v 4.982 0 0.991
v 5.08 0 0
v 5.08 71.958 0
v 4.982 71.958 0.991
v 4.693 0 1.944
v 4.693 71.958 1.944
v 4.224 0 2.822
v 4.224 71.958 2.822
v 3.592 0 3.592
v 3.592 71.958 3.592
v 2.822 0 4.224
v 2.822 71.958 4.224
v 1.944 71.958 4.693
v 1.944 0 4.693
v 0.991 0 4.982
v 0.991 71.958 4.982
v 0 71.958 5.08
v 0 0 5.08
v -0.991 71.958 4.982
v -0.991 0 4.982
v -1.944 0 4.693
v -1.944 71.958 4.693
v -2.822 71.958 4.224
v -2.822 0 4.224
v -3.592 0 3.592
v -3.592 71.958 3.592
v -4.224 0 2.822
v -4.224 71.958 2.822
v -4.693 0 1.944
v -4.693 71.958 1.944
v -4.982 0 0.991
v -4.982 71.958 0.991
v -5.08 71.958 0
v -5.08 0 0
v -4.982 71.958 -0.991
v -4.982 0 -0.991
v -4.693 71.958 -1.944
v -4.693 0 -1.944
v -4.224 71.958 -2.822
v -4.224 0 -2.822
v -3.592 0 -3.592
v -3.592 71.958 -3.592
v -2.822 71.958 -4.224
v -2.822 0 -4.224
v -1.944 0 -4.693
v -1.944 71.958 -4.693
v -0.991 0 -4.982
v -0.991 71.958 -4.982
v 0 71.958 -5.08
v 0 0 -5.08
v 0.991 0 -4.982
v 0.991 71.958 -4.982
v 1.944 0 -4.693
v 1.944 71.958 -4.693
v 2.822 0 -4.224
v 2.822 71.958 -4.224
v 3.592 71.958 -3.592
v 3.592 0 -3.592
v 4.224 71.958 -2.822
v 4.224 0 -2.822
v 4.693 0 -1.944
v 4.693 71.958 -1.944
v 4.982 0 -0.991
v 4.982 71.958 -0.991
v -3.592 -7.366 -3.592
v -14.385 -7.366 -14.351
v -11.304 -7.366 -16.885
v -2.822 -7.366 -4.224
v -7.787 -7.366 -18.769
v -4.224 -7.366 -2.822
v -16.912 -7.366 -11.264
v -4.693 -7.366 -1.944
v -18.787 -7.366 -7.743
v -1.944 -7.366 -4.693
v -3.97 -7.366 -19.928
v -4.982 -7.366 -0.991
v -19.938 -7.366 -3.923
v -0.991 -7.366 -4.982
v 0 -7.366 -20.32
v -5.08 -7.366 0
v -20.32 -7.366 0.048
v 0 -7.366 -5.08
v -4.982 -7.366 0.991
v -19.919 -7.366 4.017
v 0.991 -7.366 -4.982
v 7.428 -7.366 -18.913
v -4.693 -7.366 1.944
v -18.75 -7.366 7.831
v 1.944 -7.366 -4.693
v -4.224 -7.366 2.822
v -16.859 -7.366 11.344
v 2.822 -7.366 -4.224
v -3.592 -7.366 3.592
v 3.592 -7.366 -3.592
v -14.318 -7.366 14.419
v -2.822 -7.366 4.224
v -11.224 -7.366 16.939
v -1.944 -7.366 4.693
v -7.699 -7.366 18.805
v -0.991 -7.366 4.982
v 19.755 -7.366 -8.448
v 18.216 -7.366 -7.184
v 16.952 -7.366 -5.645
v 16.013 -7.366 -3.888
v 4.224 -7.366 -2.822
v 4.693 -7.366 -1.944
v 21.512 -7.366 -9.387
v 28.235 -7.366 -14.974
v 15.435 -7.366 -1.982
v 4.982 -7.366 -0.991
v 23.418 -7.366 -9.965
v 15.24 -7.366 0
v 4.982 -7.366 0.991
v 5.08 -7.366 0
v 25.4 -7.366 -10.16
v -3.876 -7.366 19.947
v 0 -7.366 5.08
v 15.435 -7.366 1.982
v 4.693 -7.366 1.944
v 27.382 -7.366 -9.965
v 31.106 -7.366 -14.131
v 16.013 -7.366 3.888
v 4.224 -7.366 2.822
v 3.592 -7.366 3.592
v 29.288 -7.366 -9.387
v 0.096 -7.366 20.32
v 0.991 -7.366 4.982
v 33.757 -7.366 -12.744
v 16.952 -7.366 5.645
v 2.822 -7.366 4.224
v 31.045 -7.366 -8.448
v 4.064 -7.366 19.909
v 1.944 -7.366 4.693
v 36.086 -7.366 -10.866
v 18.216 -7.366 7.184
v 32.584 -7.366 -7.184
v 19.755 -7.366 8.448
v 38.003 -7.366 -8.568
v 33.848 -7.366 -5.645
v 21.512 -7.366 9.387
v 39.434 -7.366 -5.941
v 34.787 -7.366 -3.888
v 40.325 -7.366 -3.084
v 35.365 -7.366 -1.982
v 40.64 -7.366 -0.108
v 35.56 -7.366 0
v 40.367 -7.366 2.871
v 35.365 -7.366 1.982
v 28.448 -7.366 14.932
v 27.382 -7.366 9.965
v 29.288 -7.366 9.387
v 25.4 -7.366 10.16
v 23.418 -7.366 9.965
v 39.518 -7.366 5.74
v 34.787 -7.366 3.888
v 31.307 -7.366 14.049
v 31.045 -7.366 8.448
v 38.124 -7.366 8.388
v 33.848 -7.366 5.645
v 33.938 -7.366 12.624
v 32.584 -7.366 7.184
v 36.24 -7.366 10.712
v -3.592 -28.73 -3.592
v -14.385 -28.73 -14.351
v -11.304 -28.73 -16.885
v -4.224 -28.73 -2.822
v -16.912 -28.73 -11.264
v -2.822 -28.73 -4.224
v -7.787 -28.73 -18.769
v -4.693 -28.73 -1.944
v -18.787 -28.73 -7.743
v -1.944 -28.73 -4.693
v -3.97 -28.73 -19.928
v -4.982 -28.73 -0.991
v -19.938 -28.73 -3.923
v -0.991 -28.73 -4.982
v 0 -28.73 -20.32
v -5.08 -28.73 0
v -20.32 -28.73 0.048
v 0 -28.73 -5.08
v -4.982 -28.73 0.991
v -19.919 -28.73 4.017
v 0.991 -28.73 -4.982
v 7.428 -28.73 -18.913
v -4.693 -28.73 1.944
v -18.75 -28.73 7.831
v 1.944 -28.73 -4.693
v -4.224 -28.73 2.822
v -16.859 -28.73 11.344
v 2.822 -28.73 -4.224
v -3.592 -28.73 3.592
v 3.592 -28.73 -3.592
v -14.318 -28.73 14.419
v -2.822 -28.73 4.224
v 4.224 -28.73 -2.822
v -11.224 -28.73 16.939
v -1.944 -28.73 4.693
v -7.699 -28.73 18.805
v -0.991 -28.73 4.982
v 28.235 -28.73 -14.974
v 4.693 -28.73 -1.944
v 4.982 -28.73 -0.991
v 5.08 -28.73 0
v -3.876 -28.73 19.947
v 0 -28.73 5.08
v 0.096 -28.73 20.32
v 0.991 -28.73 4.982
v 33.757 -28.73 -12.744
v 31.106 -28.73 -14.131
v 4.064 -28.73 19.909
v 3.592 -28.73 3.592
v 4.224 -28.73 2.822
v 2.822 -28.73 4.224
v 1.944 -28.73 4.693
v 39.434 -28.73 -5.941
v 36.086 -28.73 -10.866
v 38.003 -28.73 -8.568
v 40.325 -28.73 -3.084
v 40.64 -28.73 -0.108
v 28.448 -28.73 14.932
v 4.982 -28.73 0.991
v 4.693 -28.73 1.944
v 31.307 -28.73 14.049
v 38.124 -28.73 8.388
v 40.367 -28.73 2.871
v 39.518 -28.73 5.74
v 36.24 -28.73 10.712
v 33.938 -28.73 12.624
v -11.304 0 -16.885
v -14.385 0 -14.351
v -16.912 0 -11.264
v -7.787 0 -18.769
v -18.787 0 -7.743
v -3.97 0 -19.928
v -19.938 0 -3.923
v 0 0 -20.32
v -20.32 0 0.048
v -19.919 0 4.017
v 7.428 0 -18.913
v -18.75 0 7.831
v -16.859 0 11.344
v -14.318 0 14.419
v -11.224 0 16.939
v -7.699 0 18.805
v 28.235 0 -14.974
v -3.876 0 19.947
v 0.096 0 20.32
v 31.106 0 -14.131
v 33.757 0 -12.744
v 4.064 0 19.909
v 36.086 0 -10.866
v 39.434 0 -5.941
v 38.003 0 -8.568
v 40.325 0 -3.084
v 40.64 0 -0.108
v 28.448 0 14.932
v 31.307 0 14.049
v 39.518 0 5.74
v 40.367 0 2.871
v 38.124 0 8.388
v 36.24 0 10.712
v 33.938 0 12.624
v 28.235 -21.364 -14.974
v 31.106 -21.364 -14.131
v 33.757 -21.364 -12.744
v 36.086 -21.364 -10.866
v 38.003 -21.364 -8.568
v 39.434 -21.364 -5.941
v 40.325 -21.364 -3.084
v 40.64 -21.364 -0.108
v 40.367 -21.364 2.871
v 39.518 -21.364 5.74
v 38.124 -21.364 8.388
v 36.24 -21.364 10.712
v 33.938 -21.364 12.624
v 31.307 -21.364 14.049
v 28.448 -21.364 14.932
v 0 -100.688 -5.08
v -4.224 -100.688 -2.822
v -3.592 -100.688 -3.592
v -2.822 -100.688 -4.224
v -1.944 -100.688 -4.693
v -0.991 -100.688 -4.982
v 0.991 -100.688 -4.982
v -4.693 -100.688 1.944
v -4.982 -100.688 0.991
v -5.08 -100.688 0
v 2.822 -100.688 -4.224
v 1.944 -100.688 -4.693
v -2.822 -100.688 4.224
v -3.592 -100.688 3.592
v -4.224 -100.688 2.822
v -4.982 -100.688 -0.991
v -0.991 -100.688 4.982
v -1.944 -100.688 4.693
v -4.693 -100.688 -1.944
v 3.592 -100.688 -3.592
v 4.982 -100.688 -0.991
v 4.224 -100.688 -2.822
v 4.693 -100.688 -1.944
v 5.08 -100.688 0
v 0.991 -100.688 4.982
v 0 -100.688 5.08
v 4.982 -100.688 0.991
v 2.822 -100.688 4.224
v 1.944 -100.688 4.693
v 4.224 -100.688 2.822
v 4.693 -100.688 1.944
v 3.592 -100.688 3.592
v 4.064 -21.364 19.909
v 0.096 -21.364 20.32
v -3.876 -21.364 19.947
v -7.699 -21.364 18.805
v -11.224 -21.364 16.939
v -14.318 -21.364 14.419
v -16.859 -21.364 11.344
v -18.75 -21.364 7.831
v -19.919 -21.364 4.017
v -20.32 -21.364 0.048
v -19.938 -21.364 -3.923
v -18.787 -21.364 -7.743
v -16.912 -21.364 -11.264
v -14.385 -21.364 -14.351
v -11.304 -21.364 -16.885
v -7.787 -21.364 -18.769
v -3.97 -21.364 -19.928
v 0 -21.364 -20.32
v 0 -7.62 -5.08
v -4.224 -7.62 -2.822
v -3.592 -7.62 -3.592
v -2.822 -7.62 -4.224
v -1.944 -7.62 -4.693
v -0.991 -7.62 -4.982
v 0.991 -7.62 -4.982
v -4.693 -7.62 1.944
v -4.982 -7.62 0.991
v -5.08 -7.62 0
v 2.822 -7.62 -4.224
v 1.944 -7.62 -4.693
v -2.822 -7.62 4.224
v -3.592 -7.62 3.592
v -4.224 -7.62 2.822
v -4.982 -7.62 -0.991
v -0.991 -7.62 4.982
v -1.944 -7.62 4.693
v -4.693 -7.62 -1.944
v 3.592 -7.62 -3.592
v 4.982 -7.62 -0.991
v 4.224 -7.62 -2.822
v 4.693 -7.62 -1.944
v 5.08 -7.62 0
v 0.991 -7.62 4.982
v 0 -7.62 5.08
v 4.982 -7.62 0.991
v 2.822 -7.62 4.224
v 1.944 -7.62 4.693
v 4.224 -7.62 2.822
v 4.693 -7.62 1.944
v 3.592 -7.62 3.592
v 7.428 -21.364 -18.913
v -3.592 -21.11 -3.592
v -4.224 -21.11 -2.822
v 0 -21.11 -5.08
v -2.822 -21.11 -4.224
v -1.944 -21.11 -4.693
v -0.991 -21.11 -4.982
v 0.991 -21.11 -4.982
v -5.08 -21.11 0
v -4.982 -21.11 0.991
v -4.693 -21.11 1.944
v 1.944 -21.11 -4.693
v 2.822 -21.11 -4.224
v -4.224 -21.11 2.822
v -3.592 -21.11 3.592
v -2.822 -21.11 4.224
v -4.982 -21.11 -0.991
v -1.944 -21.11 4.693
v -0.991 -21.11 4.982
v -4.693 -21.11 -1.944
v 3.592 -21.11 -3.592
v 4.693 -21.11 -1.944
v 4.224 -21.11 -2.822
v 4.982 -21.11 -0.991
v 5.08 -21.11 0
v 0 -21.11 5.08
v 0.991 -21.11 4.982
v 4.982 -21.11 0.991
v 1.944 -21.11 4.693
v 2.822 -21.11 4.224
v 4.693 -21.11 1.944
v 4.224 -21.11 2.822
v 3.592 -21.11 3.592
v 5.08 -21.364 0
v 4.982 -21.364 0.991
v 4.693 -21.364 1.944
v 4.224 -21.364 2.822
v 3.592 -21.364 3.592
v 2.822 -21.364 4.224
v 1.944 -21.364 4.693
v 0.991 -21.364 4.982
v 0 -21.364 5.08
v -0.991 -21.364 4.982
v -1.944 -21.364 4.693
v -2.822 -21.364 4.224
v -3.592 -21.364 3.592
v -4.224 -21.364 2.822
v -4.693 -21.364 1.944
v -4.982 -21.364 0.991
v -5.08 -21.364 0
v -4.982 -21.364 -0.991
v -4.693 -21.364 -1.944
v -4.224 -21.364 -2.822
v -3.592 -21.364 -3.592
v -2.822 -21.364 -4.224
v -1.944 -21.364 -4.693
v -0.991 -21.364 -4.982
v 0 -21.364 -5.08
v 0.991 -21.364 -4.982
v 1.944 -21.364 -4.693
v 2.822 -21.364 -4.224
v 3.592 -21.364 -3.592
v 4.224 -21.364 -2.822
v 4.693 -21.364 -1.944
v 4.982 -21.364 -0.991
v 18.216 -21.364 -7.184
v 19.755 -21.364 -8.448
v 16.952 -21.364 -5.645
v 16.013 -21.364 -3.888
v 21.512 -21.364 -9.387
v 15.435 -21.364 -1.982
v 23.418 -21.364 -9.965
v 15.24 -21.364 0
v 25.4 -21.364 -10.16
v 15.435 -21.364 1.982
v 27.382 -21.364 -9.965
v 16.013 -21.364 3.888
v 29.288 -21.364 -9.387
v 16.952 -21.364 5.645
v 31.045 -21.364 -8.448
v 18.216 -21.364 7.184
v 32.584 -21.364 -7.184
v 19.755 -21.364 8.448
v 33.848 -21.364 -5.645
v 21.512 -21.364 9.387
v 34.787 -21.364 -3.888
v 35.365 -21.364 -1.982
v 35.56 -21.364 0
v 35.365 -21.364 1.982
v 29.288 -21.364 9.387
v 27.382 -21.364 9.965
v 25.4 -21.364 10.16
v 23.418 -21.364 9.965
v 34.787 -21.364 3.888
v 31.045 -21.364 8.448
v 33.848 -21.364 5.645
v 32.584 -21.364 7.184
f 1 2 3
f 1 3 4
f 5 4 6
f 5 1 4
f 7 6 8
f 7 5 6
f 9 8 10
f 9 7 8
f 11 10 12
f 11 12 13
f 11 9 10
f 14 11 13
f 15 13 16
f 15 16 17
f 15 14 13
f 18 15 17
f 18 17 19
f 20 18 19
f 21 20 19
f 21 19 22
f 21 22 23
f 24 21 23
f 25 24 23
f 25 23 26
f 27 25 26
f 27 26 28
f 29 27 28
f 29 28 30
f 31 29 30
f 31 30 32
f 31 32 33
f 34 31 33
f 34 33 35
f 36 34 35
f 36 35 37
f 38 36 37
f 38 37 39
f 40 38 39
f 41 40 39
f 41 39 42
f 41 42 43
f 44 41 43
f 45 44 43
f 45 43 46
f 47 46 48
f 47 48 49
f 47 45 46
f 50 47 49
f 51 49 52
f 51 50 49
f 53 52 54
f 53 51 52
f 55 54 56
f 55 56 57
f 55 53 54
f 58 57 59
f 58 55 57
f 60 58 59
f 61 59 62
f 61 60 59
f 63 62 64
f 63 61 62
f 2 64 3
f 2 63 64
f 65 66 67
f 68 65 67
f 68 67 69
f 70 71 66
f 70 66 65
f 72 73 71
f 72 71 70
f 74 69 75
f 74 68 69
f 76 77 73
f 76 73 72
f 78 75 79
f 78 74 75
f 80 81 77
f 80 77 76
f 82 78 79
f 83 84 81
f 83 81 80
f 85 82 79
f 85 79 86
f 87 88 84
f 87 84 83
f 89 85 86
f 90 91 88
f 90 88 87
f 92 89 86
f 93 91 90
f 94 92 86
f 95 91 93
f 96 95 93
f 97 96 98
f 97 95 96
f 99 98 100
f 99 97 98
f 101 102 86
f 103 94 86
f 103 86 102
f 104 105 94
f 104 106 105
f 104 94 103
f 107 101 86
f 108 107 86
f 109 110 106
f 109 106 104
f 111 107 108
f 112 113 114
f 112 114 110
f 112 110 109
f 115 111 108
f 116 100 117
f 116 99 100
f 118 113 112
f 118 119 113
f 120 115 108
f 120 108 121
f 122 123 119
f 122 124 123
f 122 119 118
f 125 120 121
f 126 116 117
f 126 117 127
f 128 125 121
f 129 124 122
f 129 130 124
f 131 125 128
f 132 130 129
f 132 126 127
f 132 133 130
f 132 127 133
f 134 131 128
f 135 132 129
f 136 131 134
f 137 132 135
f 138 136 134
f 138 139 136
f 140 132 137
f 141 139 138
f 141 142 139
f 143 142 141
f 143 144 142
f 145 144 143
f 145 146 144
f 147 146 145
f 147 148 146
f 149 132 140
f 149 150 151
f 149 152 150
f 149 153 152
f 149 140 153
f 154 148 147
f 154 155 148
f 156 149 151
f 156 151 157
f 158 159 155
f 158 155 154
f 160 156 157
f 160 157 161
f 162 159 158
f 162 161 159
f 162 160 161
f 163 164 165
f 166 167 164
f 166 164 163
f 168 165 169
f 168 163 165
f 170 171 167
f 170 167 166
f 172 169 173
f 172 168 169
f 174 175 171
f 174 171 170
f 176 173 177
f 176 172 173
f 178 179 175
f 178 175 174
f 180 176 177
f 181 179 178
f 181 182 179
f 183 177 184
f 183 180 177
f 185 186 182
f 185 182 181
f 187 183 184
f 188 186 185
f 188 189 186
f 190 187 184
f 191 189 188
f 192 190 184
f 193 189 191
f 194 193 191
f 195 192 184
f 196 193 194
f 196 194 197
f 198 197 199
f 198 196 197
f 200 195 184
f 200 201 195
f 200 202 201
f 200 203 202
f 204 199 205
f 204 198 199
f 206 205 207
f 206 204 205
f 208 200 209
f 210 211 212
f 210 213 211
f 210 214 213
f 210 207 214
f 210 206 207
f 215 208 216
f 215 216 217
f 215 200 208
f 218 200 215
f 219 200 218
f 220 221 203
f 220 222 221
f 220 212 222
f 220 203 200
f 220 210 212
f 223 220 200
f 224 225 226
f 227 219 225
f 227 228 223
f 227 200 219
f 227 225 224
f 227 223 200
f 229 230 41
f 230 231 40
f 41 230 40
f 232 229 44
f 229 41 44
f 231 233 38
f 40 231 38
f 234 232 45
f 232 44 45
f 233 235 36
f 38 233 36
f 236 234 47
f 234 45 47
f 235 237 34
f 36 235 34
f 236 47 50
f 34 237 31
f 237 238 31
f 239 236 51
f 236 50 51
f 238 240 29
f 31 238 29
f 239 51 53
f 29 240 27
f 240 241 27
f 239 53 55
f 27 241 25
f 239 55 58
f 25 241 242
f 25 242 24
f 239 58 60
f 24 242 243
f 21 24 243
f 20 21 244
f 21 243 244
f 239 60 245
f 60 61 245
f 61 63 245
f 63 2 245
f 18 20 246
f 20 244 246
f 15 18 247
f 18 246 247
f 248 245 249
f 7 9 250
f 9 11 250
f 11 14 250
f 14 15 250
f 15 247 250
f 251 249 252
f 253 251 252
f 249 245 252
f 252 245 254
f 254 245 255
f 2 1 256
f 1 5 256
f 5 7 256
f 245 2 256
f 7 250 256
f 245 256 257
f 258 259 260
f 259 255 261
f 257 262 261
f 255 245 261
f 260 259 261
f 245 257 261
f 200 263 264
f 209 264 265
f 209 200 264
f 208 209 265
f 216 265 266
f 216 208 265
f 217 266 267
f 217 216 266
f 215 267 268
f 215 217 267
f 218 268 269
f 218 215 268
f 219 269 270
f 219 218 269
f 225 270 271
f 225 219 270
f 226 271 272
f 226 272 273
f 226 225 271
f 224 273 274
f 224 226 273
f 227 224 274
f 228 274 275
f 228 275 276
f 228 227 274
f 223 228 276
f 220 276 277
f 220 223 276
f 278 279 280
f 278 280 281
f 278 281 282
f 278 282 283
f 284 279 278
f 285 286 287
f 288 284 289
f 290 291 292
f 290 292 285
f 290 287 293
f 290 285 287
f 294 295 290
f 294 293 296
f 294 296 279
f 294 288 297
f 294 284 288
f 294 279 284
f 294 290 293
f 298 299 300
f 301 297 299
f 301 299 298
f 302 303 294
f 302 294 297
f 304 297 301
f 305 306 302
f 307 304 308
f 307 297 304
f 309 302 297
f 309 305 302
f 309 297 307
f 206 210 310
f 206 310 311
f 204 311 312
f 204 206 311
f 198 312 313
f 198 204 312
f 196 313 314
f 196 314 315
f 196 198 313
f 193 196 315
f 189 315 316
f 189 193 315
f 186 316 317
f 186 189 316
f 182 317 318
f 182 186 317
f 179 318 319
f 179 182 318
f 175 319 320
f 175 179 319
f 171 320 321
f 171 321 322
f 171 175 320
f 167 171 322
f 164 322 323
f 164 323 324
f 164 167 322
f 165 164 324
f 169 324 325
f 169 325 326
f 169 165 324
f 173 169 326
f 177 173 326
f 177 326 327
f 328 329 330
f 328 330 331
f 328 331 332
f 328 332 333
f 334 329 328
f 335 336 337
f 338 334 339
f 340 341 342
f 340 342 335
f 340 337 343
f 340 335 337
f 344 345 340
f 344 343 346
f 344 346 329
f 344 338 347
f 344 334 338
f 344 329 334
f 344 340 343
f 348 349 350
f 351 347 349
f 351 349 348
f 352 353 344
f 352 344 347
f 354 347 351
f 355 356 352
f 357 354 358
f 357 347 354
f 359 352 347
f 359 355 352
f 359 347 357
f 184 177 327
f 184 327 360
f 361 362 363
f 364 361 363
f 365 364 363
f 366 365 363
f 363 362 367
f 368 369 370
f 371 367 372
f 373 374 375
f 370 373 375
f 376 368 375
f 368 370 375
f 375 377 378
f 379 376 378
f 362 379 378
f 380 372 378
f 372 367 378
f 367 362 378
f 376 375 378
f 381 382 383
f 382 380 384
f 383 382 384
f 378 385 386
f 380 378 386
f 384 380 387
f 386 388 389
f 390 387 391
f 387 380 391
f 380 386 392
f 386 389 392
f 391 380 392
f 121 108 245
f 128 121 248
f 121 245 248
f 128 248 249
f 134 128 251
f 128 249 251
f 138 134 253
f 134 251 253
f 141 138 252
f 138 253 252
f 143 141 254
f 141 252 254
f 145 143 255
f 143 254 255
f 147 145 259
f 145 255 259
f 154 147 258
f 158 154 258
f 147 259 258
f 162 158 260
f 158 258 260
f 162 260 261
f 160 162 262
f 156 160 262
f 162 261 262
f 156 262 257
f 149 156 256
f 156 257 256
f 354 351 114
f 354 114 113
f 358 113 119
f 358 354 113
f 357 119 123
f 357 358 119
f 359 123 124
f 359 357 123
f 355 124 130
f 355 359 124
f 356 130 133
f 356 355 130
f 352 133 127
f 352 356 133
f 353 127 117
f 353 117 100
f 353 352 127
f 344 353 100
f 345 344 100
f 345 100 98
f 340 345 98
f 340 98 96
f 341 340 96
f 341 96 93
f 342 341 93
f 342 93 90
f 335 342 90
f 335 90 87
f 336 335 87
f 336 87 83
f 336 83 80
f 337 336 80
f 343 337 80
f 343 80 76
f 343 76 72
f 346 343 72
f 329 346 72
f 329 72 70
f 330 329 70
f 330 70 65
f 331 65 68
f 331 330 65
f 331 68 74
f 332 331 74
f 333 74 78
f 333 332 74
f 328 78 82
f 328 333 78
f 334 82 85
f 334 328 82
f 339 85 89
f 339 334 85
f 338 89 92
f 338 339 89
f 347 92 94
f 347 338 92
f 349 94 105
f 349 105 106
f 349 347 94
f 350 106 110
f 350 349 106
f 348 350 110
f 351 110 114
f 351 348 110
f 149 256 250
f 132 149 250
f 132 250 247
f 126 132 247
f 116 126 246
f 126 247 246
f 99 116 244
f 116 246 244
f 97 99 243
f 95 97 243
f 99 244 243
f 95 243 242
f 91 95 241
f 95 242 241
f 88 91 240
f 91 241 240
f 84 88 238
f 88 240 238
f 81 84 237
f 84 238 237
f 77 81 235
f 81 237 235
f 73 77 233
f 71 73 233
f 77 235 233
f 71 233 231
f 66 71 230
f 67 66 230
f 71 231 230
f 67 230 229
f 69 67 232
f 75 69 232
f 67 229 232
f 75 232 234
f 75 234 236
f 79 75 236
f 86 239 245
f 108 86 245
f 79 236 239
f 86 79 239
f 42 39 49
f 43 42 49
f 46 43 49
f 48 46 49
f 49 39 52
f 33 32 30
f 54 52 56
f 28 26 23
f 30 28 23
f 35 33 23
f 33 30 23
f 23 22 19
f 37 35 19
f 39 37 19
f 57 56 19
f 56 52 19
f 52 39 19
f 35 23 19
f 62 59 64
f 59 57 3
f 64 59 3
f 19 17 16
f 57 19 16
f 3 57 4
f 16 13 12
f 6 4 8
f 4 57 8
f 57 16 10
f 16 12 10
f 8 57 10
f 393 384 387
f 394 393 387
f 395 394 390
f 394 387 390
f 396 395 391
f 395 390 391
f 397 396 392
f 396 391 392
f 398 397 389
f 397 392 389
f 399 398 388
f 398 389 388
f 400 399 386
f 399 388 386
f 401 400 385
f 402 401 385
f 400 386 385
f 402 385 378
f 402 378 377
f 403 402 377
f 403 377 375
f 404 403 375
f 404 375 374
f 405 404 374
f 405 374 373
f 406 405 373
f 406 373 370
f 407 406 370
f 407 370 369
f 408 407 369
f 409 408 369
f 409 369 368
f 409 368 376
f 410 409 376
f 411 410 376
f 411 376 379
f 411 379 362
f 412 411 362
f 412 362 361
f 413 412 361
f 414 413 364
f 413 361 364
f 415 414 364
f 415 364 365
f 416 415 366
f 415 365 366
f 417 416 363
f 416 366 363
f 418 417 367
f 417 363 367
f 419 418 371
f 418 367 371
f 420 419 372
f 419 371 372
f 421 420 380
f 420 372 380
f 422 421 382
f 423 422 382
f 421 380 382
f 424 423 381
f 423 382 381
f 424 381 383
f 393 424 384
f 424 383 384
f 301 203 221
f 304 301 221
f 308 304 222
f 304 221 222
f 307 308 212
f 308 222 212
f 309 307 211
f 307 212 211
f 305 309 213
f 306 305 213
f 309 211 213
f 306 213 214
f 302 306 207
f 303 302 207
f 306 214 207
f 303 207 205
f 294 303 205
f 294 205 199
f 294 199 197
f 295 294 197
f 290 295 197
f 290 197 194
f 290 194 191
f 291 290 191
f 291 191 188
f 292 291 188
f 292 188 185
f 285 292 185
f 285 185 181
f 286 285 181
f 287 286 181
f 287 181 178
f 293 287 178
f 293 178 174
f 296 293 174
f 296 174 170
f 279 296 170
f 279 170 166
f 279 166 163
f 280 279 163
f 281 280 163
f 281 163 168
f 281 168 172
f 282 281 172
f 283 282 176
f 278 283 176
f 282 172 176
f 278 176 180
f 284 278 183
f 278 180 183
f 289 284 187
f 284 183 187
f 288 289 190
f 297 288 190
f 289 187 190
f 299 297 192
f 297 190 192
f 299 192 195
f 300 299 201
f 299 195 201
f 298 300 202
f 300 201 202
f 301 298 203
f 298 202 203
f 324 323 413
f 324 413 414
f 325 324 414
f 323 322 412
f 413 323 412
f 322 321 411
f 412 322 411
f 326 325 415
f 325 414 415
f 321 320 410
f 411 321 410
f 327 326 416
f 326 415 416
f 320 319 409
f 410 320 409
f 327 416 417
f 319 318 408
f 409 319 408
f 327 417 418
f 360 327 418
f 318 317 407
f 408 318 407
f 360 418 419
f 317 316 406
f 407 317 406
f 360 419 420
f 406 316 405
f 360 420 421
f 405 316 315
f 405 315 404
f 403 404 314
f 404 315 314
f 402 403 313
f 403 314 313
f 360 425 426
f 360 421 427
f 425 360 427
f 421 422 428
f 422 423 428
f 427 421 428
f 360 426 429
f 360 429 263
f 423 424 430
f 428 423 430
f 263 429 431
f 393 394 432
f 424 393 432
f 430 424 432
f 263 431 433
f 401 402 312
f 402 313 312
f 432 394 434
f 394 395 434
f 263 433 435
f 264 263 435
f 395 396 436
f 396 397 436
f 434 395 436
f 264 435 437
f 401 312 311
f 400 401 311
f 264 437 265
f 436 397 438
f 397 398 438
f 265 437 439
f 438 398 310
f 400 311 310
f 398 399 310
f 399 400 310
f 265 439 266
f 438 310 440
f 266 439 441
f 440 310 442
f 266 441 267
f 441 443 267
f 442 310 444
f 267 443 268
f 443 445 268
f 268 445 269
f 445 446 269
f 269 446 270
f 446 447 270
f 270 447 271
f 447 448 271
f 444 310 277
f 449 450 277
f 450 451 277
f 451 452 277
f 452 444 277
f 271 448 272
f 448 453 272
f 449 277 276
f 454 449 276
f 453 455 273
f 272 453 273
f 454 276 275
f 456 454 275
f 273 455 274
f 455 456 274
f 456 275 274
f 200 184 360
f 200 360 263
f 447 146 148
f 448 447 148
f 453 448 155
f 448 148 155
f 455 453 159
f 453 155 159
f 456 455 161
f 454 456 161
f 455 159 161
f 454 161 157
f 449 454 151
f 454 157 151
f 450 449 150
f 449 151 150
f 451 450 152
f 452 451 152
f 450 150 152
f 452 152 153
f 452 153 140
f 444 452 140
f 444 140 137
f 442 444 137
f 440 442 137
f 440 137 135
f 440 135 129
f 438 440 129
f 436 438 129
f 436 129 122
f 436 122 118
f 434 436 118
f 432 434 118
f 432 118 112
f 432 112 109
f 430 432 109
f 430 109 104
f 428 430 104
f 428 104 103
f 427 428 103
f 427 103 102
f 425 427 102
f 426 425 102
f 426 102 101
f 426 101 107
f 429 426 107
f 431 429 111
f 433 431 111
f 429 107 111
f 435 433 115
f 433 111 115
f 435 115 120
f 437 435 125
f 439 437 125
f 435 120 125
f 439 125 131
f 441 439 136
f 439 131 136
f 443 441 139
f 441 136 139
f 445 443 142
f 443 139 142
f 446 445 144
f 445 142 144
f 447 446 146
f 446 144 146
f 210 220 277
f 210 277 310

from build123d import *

# Parameters (mm, degrees)
F0_R     = 5.08
F0_R_2   = 10.16
F1_DEPTH = 7.366
F2_R     = 10.16
F3_DEPTH = 6.99897
F7_R     = 5.08
F8_DEPTH = 79.5782


# Not quite as in the source:
# - a length typed as a fraction of an inch, garbled in the dataset ("3 / 203.2 mm" for 3/8 in), is restored


with BuildPart() as f1:
    # F0 (on Front) → F1 (new body)
    with BuildSketch(Plane.XZ):
        with BuildLine():
            Line((28.448, 14.932089472), (4.064, 19.9094526293))
            ThreePointArc((4.064, 19.9094526293), (-20.2171026291, 2.0423421079), (0, -20.32))
            Line((0, -20.32), (7.4284633963, -18.9134960166))
            Line((7.4284633963, -18.9134960166), (28.2351667085, -14.9739583856))
            ThreePointArc((28.2351667085, -14.9739583856), (40.639614078, -0.1084562307), (28.448, 14.932089472))
        make_face()
        Circle(F0_R, mode=Mode.SUBTRACT)
        with Locations((25.4, 0)):
            Circle(F0_R_2, mode=Mode.SUBTRACT)
        with Locations((25.4, 0)):
            Circle(F0_R_2)
    extrude(amount=F1_DEPTH)

    # F2 (on face) → F3 (join)
    with BuildSketch(Plane.XZ.offset(7.366)):
        with Locations((25.4, 0)):
            Circle(F2_R)
    extrude(amount=F3_DEPTH)

    # F5: F1 across plane


with BuildPart() as f1_1:
    add(f1.part)
    add(f1.part.mirror(Plane(origin=(25.4, -14.36497, 0), x_dir=(1, 0, 0), z_dir=(0, -1, 0))))

    # F7 (on offset) → F8 (join)
    with BuildSketch(Plane.XZ.offset(21.10994)):
        Circle(F7_R)
    extrude(amount=F8_DEPTH)

    # F9: F1 across plane


with BuildPart() as f1_2:
    add(f1_1.part)
    add(f1_1.part.mirror(Plane(origin=(25.4, -14.36497, 0), x_dir=(1, 0, 0), z_dir=(0, -1, 0))))


solid = f1_2.part
